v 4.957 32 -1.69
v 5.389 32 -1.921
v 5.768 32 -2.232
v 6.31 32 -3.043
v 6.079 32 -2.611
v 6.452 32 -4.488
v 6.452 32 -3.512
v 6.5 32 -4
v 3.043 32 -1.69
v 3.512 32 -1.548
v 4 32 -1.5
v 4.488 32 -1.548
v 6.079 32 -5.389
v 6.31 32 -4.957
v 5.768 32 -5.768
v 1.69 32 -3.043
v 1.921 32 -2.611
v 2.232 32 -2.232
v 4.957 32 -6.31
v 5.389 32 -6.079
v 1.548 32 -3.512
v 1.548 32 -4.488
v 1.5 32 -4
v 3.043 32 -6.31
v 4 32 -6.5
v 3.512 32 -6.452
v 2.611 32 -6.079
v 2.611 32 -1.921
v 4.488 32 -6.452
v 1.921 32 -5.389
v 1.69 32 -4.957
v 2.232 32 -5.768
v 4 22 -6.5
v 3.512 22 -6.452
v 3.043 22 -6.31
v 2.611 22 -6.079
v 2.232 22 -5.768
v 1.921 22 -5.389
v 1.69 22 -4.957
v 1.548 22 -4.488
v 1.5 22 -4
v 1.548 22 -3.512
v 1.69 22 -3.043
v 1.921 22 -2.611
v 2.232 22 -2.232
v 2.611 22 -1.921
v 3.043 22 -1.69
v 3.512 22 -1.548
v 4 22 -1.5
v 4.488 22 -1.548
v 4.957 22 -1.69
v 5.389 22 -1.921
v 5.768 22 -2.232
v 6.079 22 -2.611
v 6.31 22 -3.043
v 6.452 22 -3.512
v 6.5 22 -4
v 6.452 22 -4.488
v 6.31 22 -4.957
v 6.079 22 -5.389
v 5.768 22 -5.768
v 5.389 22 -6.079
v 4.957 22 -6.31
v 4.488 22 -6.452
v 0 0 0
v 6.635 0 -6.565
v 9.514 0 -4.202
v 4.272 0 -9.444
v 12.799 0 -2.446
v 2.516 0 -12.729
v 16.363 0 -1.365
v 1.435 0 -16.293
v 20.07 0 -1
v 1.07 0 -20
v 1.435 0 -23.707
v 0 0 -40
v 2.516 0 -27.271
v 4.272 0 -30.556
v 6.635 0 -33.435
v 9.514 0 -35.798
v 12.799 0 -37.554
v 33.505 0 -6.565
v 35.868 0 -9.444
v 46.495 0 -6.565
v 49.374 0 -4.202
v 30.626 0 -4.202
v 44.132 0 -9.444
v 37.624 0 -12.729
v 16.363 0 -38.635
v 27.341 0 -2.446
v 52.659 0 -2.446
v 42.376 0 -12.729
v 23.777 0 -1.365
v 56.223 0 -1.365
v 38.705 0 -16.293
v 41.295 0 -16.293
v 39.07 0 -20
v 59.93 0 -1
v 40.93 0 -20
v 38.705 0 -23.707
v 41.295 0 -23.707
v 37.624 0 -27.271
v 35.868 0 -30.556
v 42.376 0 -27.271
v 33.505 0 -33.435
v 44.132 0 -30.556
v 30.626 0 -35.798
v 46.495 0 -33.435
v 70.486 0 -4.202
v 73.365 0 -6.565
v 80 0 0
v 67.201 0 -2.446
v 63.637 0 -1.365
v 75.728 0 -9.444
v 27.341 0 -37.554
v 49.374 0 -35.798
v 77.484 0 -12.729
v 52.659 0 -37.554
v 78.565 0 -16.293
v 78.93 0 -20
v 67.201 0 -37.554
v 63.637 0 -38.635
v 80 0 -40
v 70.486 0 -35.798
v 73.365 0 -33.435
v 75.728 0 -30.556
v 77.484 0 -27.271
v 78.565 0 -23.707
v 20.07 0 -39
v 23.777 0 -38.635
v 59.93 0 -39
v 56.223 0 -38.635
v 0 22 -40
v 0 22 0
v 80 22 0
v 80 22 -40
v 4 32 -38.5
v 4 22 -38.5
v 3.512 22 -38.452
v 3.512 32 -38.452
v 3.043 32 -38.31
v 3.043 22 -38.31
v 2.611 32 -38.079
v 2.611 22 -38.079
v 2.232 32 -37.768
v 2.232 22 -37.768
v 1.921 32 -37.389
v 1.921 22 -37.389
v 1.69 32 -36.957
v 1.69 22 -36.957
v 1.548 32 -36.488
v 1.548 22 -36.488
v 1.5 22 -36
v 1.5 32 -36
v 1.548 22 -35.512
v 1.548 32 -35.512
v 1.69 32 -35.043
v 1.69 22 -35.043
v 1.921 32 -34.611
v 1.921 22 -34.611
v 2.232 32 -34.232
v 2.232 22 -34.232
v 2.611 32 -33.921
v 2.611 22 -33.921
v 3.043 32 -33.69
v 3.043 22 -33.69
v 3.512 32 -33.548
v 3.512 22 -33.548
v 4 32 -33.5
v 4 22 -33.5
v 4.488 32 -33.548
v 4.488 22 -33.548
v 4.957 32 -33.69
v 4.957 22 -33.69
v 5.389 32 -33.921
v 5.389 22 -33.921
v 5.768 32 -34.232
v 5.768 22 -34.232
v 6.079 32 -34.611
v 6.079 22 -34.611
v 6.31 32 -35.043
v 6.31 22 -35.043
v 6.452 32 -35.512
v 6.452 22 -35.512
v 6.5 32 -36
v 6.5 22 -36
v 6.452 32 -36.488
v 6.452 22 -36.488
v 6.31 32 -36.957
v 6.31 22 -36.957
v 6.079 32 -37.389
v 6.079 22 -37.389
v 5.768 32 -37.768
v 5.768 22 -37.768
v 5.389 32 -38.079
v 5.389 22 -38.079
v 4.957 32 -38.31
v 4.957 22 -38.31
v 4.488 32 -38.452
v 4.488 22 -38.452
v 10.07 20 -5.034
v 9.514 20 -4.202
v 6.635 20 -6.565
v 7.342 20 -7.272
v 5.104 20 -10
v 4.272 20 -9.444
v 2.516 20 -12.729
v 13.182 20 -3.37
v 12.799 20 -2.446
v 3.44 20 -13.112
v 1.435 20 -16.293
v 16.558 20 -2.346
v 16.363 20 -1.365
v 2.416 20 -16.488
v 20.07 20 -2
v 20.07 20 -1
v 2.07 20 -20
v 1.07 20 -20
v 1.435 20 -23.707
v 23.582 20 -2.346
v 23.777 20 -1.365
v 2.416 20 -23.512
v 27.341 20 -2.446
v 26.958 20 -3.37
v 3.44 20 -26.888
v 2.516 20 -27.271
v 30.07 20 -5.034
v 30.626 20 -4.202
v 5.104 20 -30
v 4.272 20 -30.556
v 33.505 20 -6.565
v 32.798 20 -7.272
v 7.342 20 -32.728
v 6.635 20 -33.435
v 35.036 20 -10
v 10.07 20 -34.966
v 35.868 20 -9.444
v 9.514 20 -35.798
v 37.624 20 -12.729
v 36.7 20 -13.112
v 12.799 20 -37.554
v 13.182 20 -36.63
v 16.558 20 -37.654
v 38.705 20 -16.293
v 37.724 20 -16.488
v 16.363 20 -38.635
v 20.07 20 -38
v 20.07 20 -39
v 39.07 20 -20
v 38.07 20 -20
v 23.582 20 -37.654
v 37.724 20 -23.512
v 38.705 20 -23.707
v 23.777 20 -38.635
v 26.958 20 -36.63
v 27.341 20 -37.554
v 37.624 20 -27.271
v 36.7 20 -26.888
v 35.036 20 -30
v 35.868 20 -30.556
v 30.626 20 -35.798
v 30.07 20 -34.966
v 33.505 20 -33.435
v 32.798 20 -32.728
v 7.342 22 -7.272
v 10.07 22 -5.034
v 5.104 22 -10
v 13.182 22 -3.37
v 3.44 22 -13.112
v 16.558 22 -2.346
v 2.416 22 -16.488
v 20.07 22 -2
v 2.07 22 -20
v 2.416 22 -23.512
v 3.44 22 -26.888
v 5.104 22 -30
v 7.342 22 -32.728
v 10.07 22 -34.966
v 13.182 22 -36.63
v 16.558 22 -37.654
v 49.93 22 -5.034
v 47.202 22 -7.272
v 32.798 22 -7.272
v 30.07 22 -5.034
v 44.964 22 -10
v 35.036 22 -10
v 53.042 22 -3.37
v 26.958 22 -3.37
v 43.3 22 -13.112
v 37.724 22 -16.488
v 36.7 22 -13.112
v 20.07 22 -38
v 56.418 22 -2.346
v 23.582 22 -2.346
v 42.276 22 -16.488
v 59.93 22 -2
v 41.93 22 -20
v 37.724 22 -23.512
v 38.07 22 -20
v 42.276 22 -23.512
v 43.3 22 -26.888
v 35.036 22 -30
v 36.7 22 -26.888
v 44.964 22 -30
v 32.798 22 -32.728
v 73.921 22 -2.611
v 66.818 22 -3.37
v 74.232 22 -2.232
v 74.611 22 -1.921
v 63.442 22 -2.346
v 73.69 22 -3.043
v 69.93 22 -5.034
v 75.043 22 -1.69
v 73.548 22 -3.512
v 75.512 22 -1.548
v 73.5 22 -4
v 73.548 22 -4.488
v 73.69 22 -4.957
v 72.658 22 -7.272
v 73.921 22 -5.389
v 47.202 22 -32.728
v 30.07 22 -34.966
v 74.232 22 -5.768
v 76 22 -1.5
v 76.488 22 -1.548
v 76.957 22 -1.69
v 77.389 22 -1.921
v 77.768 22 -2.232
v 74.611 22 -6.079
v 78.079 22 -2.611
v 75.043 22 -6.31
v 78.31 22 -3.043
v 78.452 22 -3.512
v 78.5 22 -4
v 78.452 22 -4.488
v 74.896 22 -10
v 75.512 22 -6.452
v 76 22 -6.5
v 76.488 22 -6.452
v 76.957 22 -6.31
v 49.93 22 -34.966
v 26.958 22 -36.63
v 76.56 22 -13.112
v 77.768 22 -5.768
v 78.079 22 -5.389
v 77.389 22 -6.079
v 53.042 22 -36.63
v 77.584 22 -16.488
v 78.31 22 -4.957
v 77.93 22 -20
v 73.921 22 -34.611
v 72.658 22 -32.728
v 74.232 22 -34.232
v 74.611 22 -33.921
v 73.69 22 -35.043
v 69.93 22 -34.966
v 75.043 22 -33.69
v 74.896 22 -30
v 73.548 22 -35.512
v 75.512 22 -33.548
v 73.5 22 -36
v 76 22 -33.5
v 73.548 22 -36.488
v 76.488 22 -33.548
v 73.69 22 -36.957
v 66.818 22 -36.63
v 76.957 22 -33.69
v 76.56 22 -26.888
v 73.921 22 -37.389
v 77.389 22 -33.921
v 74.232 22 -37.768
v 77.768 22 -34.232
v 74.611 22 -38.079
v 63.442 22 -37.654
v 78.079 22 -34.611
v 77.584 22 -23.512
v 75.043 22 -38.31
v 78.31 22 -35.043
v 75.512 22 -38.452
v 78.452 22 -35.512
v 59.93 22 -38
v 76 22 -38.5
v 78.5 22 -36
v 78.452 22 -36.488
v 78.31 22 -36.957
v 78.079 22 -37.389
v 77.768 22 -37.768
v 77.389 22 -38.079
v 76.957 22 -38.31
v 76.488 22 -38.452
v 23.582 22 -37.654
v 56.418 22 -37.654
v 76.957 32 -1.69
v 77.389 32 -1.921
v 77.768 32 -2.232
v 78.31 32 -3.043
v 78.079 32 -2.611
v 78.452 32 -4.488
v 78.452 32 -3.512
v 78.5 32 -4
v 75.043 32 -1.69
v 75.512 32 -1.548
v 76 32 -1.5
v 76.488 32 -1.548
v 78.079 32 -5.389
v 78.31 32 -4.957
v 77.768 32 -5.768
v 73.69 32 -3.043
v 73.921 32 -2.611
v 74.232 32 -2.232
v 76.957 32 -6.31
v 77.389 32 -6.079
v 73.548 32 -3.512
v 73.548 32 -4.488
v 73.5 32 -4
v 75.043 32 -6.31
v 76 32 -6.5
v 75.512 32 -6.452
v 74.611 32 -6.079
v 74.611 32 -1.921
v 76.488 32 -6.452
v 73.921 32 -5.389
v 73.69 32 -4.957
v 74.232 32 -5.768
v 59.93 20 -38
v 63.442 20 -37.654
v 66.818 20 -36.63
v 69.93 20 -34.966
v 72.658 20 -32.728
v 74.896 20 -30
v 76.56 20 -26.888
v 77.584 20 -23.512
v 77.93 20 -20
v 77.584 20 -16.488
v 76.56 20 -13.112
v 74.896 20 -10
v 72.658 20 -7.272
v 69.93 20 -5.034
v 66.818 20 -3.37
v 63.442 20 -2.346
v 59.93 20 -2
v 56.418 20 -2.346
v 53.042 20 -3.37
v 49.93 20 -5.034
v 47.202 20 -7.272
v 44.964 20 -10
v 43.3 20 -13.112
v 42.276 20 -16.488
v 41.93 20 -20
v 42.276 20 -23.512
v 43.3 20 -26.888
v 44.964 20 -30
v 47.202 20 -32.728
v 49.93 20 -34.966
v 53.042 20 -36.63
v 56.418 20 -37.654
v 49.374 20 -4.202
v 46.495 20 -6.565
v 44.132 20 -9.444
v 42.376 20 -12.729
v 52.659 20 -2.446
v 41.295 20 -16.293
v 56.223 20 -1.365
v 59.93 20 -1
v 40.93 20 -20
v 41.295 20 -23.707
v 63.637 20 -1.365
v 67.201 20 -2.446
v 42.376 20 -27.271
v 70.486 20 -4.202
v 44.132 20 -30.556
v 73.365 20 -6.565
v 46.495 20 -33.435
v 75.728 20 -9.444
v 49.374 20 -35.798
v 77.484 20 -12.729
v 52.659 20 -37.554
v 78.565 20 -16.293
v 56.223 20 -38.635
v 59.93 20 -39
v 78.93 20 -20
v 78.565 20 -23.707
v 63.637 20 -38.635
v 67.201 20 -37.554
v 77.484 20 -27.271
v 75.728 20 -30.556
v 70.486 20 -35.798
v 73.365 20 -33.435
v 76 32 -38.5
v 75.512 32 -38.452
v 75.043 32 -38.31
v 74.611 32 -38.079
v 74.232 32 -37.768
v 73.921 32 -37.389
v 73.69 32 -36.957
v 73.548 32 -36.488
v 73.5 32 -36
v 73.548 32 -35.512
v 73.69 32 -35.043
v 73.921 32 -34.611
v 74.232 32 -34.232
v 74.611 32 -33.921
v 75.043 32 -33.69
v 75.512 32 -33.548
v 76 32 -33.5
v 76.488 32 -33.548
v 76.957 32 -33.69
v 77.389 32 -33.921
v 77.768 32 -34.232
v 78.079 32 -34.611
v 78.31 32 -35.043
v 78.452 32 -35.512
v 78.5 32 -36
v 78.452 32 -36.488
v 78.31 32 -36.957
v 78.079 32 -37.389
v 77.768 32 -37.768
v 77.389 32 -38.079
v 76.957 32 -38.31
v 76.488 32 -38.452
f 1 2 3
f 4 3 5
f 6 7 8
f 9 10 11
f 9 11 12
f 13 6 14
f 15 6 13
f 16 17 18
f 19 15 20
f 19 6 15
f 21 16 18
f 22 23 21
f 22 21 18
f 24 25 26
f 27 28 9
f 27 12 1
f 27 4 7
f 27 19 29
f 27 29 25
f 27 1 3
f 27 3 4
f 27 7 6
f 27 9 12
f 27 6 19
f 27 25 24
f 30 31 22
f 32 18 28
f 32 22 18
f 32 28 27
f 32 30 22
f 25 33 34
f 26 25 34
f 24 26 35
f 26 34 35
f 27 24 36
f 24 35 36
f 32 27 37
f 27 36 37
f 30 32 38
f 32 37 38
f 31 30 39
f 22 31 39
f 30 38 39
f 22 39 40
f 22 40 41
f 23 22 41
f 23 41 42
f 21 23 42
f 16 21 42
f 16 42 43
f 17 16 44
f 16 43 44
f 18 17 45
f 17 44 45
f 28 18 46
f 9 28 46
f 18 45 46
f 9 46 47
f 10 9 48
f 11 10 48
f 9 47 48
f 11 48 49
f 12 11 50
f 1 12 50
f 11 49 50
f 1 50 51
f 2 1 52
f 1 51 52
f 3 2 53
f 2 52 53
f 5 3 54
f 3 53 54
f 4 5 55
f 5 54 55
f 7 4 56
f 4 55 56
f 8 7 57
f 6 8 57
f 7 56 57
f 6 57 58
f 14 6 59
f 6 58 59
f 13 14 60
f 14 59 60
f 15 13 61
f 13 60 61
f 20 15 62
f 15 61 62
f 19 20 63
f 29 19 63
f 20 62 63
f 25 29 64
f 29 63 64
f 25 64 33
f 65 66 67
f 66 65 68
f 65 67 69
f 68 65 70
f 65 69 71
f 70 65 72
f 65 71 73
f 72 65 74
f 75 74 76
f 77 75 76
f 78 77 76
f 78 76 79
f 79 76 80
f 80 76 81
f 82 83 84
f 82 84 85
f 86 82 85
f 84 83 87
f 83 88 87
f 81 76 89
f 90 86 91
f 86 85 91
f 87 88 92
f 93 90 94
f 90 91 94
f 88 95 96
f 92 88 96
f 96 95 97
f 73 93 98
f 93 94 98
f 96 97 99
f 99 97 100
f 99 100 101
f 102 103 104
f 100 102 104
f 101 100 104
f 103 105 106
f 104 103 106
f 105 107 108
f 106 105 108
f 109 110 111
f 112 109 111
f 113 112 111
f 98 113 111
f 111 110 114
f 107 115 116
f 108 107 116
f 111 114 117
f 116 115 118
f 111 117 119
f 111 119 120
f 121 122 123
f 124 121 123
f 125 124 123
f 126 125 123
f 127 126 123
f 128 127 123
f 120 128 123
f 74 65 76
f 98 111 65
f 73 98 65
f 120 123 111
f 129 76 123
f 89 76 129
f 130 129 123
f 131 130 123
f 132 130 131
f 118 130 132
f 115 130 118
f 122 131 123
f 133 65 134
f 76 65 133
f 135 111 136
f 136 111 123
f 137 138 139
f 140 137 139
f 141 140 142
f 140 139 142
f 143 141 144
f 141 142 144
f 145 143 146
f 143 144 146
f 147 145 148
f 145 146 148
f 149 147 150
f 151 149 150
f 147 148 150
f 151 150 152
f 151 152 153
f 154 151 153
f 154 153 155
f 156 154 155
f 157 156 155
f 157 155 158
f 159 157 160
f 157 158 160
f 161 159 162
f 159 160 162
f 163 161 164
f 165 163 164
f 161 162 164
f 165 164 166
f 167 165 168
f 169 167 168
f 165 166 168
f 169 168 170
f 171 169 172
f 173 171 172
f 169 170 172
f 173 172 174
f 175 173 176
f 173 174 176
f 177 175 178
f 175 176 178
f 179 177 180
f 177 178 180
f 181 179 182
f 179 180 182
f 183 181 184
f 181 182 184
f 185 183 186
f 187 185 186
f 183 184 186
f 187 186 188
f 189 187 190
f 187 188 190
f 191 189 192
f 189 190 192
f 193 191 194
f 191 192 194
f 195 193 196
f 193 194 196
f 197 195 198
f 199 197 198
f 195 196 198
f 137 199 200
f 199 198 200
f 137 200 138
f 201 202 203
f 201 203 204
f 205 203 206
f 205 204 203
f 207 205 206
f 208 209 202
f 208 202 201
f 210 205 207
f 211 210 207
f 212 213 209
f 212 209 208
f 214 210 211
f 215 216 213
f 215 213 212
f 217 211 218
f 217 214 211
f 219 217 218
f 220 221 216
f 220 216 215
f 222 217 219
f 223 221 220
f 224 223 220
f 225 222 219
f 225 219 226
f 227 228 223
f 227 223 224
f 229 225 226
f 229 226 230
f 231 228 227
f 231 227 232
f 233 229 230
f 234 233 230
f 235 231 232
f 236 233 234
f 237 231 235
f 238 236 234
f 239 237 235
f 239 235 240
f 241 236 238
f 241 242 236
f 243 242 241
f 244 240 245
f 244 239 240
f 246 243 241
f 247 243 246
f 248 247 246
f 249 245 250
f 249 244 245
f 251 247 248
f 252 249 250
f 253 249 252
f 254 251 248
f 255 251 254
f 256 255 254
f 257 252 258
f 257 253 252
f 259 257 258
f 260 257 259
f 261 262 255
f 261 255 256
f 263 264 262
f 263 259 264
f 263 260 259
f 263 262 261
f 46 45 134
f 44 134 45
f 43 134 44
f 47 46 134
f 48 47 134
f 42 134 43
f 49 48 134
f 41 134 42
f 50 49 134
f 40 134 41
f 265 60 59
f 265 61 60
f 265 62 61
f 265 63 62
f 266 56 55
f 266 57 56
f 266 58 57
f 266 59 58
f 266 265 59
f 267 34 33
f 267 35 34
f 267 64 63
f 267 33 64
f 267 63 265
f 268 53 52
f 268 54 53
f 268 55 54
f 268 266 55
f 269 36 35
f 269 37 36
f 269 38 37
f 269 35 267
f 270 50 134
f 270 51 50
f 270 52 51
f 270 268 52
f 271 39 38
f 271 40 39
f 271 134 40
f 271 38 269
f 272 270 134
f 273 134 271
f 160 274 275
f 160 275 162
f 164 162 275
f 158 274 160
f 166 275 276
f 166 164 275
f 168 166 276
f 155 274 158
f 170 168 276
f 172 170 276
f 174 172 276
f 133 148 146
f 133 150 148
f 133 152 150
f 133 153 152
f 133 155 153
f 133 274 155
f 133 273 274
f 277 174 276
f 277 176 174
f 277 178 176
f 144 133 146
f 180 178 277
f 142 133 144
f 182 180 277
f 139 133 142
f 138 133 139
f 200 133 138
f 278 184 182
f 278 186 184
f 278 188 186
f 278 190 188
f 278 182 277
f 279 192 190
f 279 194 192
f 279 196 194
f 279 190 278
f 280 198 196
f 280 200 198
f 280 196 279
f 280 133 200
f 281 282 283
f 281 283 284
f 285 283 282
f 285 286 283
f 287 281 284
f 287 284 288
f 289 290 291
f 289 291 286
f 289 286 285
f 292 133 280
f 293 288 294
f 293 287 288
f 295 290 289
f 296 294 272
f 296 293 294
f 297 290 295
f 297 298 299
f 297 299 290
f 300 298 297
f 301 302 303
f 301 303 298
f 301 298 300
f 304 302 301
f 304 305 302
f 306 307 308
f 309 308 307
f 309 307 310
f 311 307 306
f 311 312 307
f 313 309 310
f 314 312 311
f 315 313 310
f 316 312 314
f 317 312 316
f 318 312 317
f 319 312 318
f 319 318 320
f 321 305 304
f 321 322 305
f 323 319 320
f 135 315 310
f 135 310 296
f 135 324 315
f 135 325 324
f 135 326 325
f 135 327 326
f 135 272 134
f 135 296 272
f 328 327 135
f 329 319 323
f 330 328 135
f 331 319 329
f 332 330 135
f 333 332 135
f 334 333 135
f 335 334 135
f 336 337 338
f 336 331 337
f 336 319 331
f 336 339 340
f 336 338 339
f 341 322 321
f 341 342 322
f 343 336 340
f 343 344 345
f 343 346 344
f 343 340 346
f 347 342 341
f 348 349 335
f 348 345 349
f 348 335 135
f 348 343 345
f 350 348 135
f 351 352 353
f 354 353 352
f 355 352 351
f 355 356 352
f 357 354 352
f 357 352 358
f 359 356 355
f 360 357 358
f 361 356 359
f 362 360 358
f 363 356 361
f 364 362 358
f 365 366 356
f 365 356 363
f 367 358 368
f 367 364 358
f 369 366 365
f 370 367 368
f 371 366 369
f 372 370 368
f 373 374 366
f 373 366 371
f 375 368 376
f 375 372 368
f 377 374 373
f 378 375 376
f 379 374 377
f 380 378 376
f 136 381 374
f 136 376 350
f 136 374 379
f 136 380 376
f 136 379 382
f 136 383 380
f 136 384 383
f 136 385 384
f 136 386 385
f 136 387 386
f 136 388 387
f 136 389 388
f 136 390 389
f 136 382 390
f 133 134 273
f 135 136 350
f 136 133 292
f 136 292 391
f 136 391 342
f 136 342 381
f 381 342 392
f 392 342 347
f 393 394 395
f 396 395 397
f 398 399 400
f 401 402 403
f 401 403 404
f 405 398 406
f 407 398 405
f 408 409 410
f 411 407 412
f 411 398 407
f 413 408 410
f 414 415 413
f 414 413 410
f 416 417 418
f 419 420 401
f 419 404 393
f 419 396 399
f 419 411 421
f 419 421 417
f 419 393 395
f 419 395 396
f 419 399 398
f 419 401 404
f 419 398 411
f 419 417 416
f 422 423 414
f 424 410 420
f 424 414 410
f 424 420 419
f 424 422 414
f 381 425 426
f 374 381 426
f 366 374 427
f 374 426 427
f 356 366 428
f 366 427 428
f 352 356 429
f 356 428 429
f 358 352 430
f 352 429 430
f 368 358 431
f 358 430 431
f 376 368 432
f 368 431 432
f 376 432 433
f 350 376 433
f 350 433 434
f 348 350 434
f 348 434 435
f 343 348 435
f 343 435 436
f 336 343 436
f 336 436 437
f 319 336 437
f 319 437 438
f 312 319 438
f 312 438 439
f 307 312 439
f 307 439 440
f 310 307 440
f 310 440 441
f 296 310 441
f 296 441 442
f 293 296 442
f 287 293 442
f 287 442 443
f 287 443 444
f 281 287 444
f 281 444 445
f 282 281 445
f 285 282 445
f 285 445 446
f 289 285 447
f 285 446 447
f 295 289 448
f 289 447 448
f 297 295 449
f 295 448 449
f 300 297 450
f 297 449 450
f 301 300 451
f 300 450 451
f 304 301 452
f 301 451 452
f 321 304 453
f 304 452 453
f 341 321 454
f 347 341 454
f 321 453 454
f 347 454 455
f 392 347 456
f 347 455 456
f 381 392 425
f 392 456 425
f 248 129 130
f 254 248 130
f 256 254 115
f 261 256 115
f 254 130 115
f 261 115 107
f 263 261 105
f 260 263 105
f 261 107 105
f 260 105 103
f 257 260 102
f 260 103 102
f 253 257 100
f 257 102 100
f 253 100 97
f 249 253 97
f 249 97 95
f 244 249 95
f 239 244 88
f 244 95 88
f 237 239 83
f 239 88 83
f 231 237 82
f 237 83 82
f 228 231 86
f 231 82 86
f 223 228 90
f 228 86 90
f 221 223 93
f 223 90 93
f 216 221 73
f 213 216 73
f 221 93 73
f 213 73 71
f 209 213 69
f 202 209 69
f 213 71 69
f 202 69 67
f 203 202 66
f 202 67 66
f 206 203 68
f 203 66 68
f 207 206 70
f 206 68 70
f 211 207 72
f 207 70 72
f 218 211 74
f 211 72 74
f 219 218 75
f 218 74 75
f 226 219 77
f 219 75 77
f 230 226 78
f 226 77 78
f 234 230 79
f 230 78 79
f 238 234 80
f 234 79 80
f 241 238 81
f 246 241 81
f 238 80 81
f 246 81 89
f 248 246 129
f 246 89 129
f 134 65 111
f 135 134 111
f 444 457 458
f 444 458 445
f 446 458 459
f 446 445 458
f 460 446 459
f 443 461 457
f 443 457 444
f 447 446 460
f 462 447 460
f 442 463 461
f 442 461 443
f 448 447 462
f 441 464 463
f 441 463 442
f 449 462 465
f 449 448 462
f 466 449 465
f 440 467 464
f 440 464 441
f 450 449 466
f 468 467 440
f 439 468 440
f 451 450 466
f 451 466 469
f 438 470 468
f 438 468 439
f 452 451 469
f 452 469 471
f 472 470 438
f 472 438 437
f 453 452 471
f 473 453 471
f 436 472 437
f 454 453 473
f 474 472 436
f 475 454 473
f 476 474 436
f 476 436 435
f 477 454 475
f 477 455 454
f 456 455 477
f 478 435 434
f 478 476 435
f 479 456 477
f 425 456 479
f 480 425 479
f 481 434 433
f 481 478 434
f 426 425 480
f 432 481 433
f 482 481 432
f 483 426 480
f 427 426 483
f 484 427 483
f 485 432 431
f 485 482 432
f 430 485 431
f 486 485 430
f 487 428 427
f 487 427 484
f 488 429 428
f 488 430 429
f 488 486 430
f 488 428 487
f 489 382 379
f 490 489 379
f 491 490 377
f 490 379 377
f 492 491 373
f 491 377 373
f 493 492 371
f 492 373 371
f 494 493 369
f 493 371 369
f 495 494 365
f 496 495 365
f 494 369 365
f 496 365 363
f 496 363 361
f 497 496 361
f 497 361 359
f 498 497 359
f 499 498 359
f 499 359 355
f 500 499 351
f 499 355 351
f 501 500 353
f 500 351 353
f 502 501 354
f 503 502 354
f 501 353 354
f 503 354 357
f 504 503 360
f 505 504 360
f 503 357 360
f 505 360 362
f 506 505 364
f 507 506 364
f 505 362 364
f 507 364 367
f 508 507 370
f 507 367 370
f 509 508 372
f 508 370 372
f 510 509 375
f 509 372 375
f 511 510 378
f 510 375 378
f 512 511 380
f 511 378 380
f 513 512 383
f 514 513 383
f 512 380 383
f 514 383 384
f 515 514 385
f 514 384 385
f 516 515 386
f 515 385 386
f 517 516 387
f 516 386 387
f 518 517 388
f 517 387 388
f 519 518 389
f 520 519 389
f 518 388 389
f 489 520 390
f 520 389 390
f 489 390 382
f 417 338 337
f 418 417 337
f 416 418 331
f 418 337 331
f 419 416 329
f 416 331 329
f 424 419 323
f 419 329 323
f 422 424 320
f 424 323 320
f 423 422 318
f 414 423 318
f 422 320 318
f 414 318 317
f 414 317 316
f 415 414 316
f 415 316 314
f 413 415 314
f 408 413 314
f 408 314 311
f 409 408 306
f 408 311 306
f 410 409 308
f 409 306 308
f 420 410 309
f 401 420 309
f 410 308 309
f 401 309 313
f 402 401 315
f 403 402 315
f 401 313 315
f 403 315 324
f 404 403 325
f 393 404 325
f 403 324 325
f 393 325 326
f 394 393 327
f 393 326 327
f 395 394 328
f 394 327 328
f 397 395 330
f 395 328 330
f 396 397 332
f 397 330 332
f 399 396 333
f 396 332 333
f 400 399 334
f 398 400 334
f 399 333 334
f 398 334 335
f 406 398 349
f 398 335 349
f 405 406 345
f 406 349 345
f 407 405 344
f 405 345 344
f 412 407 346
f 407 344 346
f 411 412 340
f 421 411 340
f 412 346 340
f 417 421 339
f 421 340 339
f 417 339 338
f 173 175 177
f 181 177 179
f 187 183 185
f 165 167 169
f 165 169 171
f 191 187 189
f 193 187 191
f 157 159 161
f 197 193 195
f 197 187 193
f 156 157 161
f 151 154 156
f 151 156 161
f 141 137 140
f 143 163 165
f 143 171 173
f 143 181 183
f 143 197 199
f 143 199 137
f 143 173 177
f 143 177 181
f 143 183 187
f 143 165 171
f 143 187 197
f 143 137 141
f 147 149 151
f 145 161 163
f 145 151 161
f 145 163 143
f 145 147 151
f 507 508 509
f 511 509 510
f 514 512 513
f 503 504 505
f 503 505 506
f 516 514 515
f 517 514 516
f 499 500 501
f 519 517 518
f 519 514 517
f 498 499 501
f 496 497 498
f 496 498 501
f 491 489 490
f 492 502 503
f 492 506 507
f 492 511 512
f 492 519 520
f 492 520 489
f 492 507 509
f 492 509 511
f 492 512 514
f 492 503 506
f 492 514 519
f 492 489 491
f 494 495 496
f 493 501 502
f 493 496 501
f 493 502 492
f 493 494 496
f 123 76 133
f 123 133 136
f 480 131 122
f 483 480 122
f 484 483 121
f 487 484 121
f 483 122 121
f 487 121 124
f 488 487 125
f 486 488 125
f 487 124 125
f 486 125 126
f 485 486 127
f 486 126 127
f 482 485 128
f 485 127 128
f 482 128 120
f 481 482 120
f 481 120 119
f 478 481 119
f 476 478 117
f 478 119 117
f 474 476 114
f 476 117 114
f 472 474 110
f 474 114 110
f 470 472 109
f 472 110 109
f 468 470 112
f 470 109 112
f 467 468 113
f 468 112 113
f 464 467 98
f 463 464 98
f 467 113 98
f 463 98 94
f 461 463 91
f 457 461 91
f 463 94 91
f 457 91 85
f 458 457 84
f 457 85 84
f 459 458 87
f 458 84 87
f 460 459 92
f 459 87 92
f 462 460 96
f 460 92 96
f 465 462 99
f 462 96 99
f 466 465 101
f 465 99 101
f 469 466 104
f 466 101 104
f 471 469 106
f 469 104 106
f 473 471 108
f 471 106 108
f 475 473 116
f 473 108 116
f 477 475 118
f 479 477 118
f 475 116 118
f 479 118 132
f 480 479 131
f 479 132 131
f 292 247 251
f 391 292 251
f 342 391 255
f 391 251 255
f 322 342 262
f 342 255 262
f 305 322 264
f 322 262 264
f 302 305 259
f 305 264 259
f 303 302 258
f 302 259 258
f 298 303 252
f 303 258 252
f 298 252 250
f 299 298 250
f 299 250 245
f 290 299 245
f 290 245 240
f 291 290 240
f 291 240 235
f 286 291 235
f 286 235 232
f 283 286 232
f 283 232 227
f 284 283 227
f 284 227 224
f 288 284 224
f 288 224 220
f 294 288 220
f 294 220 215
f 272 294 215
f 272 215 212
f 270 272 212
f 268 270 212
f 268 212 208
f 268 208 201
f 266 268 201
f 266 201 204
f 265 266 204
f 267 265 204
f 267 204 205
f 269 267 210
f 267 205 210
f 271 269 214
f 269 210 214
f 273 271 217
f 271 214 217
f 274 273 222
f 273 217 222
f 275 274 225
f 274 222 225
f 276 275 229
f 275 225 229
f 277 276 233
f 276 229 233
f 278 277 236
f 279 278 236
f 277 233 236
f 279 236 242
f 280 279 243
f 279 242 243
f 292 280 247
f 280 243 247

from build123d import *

# Parameters (mm, degrees)
SKETCH1_W           = 80
SKETCH1_H           = 40
BOSS_EXTRUDE1_DEPTH = 22
SKETCH2_R           = 19
CUT_EXTRUDE1_DEPTH  = 20
SKETCH3_R           = 17.999999941
CUT_EXTRUDE2_DEPTH  = 92.651513899
SKETCH4_R           = 2.5
BOSS_EXTRUDE2_DEPTH = 10


with BuildPart() as part:
    # Sketch1 → Boss-Extrude1 (new body)
    with BuildSketch(Plane(origin=(0, 0, 0), x_dir=(1, 0, 0), z_dir=(0, 1, 0))):
        with Locations((40, 20)):
            Rectangle(SKETCH1_W, SKETCH1_H)
    extrude(amount=BOSS_EXTRUDE1_DEPTH)

    # Sketch2 → Cut-Extrude1 (cut)
    with BuildSketch(Plane.XZ):
        with Locations(Location((20.07, -20, 0), (0, 0, 270))):
            Circle(SKETCH2_R)
        with Locations(Location((59.93, -20, 0), (0, 0, 270))):
            Circle(SKETCH2_R)
    extrude(amount=-CUT_EXTRUDE1_DEPTH, mode=Mode.SUBTRACT)

    # Sketch3 → Cut-Extrude2 (cut, through all)
    with BuildSketch(Plane.XZ.offset(-20)):
        with Locations(Location((20.07, -20, 0), (0, 0, 270))):
            Circle(SKETCH3_R)
        with Locations(Location((59.93, -20, 0), (0, 0, 270))):
            Circle(SKETCH3_R)
    extrude(amount=-CUT_EXTRUDE2_DEPTH, mode=Mode.SUBTRACT)

    # Sketch4 → Boss-Extrude2 (add)
    with BuildSketch(Plane(origin=(0, 22, 0), x_dir=(1, 0, 0), z_dir=(0, 1, 0))):
        with Locations(Location((4, 36, 0), (0, 0, 90))):
            Circle(SKETCH4_R)
        with Locations(Location((76, 36, 0), (0, 0, 90))):
            Circle(SKETCH4_R)
        with Locations(Location((76, 4, 0), (0, 0, 90))):
            Circle(SKETCH4_R)
        with Locations(Location((4, 4, 0), (0, 0, 90))):
            Circle(SKETCH4_R)
    extrude(amount=BOSS_EXTRUDE2_DEPTH)


solid = part.part
